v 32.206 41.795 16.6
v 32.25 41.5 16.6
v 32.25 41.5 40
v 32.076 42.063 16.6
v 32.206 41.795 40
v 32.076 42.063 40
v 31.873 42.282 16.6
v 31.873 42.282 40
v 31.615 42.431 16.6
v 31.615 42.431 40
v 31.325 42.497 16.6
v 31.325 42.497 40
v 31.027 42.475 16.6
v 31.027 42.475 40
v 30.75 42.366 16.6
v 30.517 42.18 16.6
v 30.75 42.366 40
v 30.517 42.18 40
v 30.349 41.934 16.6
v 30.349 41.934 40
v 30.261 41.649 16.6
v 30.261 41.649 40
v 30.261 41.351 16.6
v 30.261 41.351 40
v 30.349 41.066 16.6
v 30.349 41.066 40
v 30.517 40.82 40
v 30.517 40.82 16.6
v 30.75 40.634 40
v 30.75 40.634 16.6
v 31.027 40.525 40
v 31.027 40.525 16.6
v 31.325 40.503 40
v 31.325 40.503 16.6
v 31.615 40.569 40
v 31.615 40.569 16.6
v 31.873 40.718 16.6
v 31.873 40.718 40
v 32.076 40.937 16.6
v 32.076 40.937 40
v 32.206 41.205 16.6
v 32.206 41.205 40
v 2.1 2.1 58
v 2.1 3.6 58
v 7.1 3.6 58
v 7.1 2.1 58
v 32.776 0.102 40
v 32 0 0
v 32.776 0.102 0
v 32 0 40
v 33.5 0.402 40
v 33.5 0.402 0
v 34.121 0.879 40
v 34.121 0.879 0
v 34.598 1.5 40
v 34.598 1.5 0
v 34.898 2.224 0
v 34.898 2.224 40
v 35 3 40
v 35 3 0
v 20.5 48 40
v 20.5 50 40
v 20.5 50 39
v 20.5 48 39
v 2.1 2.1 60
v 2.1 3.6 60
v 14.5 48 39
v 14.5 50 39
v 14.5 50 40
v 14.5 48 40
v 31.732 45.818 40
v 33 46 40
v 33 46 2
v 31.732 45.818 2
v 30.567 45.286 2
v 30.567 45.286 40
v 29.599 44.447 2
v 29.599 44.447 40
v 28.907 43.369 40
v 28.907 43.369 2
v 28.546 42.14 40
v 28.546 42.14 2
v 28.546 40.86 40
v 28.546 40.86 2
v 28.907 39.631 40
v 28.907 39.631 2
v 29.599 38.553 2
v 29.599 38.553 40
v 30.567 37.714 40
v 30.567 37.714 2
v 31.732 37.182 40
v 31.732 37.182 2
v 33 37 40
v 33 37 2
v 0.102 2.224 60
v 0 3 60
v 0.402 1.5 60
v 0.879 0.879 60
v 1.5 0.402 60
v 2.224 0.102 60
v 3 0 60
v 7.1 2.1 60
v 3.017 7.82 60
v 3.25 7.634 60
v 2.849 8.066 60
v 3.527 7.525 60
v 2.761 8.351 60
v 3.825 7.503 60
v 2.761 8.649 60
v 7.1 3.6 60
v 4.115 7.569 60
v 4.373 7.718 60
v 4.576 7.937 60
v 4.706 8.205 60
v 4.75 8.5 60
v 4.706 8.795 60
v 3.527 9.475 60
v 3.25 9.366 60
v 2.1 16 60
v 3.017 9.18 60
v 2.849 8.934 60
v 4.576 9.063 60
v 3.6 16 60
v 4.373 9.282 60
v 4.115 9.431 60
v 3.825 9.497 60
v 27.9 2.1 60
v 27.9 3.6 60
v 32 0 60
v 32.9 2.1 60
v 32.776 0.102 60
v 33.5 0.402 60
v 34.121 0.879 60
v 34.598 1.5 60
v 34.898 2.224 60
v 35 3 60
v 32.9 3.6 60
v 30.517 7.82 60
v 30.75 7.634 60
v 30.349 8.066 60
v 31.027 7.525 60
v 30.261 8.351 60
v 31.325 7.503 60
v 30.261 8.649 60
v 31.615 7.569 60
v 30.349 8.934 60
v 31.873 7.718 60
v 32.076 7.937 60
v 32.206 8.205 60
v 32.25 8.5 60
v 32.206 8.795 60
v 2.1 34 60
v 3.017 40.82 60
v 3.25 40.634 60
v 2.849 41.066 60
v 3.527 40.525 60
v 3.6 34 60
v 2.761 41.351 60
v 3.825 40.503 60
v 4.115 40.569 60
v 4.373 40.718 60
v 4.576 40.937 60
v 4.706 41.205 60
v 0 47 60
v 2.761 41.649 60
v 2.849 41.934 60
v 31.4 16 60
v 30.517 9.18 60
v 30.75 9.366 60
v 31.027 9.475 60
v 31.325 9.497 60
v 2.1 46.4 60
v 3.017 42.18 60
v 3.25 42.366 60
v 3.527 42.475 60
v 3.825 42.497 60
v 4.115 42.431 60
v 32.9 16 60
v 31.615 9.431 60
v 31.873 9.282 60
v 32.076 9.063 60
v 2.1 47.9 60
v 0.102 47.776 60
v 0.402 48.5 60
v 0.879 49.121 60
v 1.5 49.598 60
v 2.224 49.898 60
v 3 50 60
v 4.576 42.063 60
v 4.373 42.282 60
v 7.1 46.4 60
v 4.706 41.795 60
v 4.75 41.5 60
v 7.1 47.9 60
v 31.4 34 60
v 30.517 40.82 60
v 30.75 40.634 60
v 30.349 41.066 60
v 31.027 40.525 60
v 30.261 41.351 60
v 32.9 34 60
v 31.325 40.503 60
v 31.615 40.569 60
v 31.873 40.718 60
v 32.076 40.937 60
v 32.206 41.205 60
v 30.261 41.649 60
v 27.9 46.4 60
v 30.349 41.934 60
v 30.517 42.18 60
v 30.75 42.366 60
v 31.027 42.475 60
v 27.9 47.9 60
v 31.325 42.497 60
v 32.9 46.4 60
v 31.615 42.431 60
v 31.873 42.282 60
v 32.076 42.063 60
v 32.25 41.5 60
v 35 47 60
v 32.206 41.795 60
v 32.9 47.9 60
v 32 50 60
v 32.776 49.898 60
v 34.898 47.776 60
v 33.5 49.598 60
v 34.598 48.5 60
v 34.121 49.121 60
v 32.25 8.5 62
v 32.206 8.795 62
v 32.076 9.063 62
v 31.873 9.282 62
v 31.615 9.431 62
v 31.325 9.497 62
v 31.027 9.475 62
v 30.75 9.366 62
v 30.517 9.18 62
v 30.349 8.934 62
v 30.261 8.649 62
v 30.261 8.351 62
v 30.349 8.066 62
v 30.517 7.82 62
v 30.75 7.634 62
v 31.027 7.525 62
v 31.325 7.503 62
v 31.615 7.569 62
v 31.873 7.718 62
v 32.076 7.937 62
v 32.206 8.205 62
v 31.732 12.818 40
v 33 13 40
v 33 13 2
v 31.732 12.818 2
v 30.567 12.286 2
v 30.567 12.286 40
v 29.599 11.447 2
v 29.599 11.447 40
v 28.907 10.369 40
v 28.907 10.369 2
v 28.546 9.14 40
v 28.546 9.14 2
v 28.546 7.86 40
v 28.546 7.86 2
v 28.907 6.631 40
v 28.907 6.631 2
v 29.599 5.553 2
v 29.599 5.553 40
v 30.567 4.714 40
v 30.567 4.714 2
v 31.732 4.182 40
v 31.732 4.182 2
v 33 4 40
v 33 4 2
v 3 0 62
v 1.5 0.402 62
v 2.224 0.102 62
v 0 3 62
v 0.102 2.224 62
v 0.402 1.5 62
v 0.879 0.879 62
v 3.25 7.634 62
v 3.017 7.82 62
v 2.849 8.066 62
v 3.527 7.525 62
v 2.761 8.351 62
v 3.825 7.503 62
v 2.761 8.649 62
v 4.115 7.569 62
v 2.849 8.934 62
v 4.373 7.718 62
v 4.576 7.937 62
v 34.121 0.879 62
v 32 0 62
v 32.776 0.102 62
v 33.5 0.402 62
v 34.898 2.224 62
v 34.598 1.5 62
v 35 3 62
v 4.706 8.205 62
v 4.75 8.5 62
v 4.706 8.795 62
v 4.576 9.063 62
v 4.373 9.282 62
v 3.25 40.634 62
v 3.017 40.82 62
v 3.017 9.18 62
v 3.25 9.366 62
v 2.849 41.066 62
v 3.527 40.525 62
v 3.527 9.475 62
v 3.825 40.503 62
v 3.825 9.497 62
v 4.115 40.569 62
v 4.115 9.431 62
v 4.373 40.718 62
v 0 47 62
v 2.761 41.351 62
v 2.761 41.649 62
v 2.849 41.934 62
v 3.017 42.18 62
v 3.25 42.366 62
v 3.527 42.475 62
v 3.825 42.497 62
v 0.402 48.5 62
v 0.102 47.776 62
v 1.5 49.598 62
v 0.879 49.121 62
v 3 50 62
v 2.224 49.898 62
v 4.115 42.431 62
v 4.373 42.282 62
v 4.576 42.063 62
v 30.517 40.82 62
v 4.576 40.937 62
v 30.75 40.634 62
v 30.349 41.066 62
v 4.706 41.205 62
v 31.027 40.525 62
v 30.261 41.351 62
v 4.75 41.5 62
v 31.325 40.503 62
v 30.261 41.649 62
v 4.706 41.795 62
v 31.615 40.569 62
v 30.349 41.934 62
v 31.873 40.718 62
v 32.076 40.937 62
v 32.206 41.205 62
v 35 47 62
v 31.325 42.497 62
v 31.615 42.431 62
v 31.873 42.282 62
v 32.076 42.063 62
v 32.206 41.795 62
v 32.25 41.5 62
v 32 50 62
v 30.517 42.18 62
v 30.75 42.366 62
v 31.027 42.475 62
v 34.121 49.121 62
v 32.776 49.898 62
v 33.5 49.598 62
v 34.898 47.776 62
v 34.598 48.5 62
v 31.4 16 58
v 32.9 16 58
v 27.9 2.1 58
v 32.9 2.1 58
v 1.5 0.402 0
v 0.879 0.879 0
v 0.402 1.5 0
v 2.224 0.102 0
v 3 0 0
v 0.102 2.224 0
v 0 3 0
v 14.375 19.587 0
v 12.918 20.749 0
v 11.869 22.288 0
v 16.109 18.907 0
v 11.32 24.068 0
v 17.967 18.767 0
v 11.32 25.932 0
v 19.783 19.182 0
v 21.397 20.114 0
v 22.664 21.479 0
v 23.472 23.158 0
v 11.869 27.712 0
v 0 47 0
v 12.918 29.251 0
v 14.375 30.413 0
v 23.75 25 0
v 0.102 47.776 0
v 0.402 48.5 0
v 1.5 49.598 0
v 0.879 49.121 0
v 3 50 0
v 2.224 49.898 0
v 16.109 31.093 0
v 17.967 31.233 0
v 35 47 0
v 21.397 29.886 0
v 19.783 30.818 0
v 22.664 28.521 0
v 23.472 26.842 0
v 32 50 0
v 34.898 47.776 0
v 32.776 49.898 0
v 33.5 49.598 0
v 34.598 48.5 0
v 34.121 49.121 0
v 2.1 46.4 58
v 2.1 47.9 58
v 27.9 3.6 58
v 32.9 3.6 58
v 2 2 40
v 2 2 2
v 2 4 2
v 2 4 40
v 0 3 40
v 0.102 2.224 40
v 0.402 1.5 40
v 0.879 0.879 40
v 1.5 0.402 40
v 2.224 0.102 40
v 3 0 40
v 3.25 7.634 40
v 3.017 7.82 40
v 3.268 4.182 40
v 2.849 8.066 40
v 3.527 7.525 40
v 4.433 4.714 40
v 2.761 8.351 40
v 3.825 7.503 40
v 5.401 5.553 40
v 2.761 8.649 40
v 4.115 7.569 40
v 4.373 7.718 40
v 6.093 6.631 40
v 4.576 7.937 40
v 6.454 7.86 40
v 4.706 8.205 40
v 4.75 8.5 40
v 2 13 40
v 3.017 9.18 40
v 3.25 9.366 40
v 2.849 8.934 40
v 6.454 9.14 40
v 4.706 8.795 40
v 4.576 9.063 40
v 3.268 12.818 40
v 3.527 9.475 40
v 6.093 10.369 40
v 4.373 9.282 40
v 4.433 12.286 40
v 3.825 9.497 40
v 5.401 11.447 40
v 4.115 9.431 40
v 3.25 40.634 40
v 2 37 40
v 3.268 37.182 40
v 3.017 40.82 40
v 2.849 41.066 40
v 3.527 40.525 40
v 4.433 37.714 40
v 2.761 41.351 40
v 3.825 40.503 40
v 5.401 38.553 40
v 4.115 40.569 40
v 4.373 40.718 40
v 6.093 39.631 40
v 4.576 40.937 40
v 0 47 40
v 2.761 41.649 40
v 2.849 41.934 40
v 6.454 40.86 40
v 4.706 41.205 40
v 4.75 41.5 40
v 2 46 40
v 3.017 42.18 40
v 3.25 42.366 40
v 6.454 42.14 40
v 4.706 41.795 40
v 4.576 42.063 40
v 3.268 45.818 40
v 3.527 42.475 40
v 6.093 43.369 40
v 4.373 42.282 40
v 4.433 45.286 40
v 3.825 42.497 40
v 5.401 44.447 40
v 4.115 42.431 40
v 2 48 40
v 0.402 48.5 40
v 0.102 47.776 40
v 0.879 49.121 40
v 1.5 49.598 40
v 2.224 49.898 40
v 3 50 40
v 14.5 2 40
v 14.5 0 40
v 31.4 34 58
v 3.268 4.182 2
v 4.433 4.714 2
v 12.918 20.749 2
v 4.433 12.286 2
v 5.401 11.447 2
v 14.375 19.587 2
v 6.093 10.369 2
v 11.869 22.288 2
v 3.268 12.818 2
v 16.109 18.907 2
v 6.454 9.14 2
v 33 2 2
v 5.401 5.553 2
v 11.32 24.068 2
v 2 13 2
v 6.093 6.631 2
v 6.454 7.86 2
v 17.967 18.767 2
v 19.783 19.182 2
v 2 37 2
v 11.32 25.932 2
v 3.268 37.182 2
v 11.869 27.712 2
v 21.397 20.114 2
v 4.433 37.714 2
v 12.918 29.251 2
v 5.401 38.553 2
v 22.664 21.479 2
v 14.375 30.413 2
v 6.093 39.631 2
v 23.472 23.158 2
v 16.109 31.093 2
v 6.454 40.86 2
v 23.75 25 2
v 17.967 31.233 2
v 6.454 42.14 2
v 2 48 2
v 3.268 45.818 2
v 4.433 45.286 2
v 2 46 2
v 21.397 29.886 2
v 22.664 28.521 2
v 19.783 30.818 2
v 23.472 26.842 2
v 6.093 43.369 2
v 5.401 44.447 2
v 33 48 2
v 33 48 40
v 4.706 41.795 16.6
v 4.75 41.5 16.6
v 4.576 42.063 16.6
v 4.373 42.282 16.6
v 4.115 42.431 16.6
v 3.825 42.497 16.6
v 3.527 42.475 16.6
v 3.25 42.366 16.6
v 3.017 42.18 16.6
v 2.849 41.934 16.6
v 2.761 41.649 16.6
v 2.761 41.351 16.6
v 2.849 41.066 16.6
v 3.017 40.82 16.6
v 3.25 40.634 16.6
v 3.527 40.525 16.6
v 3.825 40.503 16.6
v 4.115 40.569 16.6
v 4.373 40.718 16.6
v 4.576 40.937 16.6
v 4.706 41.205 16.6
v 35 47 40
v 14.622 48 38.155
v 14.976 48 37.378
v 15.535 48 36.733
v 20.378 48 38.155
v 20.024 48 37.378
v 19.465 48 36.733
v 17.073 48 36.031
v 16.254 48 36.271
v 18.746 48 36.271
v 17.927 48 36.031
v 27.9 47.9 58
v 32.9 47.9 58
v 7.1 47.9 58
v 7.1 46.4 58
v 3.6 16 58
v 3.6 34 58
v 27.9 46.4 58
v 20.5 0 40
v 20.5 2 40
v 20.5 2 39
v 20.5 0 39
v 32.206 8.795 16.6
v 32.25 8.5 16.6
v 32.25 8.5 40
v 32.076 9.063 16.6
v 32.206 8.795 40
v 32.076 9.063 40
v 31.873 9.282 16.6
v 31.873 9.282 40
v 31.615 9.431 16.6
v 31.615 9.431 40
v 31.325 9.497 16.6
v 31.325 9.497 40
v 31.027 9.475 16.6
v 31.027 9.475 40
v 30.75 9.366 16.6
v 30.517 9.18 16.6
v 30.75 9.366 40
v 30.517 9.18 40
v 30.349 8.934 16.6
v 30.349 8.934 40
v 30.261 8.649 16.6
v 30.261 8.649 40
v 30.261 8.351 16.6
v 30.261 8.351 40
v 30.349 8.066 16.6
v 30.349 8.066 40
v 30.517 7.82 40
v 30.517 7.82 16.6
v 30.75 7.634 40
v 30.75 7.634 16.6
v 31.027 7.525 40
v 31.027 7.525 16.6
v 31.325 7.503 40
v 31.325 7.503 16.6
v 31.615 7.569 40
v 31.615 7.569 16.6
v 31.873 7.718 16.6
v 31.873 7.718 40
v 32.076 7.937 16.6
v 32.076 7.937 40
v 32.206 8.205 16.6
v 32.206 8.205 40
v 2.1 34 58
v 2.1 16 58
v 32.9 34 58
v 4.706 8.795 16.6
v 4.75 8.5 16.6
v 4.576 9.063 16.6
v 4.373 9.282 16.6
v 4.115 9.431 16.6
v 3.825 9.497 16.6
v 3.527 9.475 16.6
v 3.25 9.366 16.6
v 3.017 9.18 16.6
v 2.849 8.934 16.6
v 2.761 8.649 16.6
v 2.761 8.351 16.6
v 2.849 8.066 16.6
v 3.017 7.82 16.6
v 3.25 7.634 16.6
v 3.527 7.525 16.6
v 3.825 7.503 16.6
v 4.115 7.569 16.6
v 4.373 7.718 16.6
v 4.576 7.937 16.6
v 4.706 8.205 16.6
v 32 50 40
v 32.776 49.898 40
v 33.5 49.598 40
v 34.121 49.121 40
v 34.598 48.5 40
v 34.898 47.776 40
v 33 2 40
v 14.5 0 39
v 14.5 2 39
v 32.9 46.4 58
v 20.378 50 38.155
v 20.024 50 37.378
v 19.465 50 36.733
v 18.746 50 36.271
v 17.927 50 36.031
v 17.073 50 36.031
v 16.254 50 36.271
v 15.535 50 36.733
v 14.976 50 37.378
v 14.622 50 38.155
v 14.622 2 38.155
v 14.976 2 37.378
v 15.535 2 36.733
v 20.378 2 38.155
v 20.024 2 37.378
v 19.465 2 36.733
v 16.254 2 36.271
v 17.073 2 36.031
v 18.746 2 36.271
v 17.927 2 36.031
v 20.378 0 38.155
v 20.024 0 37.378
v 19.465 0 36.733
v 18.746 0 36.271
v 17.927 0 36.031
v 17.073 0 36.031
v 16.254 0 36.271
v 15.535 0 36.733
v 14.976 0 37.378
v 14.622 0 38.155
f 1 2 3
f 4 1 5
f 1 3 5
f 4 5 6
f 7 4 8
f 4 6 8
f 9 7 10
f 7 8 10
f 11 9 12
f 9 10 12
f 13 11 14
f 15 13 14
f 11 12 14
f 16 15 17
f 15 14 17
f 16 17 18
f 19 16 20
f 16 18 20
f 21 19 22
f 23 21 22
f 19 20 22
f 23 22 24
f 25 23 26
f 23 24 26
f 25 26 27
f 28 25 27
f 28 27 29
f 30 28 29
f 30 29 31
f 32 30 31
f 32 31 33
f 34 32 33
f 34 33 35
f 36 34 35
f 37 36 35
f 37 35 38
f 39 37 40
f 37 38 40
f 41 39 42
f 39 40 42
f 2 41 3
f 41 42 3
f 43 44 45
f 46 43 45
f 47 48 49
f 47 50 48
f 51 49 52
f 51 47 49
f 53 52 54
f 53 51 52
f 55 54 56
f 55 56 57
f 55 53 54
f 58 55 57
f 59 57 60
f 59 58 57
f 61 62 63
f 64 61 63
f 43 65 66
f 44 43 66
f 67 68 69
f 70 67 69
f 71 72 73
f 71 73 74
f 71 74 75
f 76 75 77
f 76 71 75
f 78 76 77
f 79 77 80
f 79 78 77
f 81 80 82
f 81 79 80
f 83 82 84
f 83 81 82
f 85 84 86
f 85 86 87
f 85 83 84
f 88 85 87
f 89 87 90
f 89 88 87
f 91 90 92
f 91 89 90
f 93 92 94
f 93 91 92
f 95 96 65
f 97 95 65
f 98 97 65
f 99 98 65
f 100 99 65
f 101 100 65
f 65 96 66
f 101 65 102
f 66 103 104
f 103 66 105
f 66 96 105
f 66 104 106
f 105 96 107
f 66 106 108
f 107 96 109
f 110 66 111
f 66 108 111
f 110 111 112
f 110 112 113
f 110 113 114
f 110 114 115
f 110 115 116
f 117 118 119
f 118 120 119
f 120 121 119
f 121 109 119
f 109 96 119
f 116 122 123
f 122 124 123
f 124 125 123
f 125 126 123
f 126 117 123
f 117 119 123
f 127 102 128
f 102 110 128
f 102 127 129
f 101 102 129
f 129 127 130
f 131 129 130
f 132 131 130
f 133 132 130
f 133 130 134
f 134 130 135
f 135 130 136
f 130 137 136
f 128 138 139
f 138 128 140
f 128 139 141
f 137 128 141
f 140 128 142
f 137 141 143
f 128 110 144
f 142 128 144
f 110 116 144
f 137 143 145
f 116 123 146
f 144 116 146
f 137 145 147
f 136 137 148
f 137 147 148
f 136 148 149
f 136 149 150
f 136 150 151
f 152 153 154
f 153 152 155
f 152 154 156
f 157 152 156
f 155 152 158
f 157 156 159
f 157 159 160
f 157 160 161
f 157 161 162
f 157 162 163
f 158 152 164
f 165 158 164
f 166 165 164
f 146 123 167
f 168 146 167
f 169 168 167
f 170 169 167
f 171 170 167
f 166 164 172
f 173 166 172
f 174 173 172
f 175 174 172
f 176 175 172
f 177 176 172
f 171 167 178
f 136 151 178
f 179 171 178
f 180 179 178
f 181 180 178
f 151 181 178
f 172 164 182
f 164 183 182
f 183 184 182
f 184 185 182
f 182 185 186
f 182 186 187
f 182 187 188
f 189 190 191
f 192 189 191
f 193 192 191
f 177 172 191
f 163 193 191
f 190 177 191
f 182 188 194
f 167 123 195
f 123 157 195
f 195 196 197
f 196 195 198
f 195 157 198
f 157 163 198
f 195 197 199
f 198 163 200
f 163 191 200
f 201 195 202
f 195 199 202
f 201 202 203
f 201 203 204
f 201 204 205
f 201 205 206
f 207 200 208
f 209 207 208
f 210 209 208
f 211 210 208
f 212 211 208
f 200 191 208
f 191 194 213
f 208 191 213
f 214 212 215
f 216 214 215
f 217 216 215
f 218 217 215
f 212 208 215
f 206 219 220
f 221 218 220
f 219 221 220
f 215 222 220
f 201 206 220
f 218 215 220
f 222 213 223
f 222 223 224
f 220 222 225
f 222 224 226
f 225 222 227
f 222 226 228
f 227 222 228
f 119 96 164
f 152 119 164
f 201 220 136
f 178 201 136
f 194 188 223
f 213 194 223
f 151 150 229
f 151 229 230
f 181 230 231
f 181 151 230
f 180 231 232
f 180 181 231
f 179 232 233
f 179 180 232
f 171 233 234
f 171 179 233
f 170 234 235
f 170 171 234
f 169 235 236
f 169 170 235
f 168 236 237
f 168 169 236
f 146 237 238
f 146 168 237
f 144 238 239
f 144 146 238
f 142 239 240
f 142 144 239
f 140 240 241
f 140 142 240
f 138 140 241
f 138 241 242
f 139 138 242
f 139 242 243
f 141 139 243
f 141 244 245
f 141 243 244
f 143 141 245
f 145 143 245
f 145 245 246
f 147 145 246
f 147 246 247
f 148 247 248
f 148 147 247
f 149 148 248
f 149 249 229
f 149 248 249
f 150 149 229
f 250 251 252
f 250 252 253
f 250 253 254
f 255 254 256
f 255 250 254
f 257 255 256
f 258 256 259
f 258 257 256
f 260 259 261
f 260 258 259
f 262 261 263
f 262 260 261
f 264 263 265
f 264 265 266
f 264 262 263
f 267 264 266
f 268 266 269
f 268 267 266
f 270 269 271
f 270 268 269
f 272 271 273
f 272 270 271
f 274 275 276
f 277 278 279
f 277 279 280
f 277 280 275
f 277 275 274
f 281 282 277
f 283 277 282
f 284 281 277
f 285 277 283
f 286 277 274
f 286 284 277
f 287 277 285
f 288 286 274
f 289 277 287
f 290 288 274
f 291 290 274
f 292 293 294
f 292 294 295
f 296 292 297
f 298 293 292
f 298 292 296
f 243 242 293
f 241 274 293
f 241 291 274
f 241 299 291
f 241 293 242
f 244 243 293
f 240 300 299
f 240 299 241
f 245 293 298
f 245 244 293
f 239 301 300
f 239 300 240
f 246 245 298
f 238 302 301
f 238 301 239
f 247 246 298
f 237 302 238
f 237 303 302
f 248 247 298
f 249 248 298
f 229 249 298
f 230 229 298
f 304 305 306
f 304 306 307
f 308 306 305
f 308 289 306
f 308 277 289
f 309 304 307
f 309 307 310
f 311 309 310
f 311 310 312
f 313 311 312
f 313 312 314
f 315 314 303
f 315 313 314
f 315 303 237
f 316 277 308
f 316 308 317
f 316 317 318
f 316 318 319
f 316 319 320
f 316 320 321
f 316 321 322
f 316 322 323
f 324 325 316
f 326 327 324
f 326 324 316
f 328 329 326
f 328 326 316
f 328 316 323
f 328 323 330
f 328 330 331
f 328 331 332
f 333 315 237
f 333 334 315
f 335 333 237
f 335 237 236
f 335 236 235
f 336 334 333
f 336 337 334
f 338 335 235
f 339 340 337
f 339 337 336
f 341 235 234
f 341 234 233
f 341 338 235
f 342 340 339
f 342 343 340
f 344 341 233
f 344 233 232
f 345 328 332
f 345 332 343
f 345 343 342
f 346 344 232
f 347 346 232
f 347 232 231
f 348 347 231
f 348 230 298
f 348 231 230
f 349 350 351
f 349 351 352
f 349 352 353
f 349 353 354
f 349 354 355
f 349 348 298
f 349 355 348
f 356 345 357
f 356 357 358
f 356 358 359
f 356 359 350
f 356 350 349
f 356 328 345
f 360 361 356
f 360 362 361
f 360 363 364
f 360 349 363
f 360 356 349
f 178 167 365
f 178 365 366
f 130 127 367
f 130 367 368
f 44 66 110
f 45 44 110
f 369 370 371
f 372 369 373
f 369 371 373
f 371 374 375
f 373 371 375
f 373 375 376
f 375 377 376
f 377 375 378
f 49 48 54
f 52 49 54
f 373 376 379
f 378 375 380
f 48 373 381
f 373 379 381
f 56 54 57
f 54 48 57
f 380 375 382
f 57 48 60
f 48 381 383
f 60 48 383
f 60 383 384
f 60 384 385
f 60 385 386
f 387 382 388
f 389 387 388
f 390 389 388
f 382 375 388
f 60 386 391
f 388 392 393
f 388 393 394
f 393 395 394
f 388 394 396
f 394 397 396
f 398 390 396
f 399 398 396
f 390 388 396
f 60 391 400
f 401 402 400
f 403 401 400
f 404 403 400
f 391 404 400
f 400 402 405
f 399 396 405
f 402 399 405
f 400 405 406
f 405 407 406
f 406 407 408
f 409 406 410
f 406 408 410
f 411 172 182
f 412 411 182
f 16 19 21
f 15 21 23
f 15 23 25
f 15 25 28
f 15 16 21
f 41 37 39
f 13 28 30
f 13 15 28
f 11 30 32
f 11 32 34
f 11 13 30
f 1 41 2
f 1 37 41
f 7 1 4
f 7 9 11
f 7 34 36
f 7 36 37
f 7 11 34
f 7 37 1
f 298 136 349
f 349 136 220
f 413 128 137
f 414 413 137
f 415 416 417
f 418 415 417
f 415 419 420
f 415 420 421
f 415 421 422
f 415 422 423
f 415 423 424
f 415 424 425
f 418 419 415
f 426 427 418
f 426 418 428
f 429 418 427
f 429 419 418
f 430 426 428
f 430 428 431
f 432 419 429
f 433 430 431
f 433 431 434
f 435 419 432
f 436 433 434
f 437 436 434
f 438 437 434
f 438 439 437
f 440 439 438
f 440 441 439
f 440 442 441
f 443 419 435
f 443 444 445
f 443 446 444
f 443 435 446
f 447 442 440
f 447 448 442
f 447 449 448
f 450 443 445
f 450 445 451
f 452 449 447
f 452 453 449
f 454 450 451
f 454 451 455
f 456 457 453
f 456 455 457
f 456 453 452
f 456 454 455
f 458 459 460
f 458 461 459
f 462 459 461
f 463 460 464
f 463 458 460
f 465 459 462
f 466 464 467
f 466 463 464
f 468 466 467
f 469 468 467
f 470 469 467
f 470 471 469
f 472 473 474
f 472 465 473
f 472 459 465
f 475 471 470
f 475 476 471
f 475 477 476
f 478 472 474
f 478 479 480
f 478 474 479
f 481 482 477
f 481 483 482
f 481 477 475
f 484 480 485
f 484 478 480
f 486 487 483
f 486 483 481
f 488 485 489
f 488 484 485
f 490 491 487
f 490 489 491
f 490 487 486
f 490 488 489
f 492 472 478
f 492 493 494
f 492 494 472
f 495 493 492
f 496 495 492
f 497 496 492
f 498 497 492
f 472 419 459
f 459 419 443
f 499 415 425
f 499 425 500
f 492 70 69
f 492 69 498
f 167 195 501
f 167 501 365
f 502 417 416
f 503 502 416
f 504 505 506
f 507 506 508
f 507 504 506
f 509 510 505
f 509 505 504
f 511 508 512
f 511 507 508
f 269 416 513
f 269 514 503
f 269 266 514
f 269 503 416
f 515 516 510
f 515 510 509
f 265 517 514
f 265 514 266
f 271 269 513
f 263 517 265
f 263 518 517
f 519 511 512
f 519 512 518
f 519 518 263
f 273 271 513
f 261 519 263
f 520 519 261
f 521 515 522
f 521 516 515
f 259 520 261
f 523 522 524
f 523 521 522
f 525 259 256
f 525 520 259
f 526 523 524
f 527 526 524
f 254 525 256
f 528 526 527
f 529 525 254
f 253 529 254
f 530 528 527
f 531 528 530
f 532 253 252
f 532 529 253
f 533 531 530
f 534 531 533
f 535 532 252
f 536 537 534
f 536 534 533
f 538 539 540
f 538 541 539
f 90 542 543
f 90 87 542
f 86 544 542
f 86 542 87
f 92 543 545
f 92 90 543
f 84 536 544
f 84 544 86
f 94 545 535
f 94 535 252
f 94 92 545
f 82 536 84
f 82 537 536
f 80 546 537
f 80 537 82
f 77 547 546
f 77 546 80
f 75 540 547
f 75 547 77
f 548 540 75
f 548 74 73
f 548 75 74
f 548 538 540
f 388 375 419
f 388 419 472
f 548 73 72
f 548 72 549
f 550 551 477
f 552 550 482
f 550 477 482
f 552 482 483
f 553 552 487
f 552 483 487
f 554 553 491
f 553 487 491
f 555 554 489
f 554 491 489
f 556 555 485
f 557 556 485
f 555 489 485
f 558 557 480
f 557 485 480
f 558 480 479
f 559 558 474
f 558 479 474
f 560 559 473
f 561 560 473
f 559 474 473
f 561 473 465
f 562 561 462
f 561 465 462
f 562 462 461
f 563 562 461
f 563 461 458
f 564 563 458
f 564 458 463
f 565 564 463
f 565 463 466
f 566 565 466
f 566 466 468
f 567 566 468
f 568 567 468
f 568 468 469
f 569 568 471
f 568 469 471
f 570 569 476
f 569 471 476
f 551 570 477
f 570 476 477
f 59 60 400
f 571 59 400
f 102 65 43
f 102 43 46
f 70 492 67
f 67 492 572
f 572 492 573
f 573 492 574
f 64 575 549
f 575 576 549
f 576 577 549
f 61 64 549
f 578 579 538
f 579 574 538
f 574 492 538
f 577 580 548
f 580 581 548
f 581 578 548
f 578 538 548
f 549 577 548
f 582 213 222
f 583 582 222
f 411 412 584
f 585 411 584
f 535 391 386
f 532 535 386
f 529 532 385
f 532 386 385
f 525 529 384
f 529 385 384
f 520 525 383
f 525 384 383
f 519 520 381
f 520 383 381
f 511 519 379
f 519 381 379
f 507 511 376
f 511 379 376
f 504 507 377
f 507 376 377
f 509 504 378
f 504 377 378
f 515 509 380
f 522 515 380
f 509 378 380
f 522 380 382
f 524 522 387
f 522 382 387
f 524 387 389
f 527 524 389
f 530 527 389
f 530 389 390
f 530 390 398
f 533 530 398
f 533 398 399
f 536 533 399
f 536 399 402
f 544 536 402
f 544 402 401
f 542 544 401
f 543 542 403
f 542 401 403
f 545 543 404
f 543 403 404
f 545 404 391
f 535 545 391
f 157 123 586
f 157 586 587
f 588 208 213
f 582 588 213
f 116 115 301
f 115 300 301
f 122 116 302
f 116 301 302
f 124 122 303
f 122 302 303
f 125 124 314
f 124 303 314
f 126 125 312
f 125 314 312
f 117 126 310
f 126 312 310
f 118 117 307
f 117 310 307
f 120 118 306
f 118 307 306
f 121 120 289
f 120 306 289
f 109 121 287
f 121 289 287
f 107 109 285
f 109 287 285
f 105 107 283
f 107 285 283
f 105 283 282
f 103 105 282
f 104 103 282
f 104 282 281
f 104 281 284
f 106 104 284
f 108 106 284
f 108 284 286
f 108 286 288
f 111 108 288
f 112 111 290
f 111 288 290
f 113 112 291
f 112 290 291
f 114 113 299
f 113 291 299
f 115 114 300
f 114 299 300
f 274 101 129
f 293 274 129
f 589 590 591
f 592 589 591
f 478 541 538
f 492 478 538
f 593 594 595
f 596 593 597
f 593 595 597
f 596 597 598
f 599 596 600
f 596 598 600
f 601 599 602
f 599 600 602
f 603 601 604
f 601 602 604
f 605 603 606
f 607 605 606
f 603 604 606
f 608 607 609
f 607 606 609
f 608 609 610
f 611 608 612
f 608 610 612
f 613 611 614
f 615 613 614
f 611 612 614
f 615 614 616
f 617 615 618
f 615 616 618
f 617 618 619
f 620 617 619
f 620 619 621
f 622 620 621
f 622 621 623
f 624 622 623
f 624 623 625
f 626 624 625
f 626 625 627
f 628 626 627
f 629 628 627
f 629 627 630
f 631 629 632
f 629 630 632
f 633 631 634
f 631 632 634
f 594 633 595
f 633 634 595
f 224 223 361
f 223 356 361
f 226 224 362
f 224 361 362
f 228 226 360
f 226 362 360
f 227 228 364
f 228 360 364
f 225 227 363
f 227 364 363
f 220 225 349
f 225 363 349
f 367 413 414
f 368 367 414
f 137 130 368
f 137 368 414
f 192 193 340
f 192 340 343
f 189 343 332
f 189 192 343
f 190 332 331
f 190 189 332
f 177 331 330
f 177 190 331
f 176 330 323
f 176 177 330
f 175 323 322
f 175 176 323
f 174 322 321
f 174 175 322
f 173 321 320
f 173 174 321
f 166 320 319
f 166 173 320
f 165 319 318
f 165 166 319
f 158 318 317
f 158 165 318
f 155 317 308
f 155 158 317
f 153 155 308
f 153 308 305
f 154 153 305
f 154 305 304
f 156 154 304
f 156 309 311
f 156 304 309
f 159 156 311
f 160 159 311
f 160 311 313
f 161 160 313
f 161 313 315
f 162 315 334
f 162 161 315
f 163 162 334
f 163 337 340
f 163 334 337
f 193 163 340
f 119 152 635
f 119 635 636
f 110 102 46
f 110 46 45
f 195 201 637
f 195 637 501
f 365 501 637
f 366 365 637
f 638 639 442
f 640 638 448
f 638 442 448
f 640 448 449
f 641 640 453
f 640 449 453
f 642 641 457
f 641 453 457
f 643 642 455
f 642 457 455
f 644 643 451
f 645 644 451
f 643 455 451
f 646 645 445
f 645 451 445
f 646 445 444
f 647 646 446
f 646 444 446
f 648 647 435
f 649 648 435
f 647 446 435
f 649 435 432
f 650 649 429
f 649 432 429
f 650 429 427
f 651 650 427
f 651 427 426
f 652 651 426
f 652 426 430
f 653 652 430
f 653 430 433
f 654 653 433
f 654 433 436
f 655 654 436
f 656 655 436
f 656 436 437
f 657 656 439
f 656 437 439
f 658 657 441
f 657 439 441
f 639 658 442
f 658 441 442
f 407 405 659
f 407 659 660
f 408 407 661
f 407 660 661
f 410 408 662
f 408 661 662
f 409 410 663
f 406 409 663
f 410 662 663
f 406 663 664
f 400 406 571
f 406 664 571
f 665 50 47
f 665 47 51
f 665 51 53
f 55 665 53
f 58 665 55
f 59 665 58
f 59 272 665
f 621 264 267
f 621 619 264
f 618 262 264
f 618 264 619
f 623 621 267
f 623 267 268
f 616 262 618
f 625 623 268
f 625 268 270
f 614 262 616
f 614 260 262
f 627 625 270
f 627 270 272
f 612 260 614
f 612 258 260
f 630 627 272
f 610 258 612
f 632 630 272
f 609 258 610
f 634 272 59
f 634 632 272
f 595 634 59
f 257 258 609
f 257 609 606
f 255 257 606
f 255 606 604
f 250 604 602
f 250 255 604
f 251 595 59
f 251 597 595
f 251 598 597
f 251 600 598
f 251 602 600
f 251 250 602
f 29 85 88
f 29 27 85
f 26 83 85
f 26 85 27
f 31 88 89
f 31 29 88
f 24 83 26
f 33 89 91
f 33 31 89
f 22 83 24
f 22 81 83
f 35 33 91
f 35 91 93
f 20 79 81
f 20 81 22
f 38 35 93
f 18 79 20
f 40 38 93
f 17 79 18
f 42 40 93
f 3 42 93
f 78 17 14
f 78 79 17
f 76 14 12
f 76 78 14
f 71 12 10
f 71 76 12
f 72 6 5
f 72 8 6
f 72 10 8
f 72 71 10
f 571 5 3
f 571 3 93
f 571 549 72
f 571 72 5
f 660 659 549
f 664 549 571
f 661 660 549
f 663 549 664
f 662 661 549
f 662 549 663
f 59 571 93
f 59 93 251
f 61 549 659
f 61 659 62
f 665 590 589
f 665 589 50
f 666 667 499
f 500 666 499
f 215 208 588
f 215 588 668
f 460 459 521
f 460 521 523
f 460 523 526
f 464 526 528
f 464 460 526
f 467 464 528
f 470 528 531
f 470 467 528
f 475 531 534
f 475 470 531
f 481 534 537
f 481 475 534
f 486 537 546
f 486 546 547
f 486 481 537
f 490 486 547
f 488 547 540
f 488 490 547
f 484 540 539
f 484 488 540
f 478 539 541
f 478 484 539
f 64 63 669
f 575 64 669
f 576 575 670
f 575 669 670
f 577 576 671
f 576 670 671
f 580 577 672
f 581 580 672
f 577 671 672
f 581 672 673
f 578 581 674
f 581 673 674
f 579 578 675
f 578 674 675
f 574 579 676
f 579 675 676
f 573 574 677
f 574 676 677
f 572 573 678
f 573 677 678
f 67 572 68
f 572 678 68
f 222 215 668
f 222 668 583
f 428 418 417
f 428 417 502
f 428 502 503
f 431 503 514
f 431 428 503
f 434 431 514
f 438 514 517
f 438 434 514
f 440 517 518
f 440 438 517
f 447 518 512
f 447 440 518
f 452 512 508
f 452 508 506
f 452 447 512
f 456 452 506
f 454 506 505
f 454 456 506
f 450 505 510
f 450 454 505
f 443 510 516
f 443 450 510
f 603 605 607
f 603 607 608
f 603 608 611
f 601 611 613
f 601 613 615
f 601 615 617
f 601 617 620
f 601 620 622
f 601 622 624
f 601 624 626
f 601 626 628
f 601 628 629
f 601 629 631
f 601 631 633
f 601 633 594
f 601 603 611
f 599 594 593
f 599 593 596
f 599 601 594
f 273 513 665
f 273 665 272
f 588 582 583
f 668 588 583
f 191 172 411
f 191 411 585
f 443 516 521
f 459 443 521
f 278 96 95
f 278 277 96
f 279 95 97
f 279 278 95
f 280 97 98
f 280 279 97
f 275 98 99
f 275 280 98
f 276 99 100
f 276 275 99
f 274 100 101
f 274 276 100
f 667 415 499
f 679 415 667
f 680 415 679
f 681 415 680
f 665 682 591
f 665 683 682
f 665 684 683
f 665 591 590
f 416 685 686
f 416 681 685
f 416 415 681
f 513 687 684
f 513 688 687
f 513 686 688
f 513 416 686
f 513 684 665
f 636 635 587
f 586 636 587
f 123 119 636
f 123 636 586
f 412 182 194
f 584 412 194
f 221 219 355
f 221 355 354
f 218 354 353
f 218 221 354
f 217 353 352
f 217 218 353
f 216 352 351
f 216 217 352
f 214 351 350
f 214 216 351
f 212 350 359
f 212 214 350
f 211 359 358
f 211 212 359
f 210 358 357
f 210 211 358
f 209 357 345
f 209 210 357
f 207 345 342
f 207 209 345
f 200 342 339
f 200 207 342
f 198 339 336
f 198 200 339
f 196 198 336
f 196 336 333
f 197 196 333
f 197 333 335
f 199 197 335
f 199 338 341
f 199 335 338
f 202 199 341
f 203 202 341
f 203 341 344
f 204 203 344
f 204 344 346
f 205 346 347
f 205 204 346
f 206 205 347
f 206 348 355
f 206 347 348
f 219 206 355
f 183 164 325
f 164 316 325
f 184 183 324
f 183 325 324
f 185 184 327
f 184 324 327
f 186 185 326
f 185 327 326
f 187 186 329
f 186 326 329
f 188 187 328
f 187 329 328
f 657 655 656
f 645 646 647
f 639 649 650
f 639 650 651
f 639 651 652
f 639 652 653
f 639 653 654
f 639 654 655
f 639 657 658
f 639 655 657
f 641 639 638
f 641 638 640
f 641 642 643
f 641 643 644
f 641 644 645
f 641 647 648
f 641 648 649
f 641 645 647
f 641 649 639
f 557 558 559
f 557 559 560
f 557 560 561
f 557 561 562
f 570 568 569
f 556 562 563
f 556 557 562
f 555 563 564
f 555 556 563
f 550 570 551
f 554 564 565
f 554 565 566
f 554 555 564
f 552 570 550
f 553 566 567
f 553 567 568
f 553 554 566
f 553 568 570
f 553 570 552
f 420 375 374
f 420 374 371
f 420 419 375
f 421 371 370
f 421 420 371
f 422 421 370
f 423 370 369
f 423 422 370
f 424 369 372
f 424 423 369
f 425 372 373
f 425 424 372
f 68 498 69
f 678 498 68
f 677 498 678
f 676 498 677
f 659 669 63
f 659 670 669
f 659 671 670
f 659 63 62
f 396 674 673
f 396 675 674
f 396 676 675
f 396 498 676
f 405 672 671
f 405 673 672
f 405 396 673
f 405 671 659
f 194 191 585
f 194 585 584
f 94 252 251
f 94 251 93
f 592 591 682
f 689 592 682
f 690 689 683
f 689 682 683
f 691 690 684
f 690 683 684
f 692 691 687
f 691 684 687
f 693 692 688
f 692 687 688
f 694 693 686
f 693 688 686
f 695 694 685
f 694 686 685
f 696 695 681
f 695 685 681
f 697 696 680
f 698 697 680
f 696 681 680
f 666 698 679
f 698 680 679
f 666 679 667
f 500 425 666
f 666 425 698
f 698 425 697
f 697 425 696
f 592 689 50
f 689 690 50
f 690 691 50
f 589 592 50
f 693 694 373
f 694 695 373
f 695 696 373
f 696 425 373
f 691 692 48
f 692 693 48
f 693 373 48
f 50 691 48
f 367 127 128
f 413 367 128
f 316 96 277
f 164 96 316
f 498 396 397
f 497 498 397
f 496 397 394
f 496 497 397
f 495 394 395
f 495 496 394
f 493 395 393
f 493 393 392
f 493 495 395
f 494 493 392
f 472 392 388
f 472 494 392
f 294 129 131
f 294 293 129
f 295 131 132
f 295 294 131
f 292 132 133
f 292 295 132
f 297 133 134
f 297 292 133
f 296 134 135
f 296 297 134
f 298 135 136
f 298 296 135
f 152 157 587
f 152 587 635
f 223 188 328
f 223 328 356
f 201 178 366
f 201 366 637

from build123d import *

# Parameters (mm, degrees)
F0_W      = 35
F0_H      = 50
F1_DEPTH  = 40
F2_T      = -2
F3_R      = 6.25
F4_DEPTH  = 2
F6_DEPTH  = 50.001
F8_DEPTH  = 39
F10_W     = 35
F10_H     = 50
F11_DEPTH = 2
F12_W     = 5
F12_H     = 1.5
F13_DEPTH = 4
F14_R     = 1
F15_DEPTH = 23.4
F16_R     = 3
F16_2_R   = 3


with BuildPart() as f1:
    # F0 (on Top) → F1 (new body)
    with BuildSketch(Plane.XY):
        with Locations((17.5, 25)):
            Rectangle(F0_W, F0_H)
    extrude(amount=F1_DEPTH)

    # F2
    f2_openings = [f1.faces().sort_by_distance(p)[0] for p in [
        (17.5, 25, 40),
    ]]
    offset(amount=F2_T, openings=f2_openings)

    # F3 (on face) → F4 (cut, through all)
    with BuildSketch(Plane(origin=(0, 0, 0), x_dir=(1, 0, 0), z_dir=(0, 0, -1))):
        with Locations((17.5, -25)):
            Circle(F3_R)
    extrude(amount=-F4_DEPTH, mode=Mode.SUBTRACT)

    # F5 (on face) → F6 (cut, through all)
    with BuildSketch(Plane(origin=(0, 50, 0), x_dir=(-1, 0, 0), z_dir=(0, 1, 0))):
        with BuildLine():
            Line((-14.5, 40), (-20.5, 40))
            Line((-20.5, 40), (-20.5, 39))
            ThreePointArc((-20.5, 39), (-17.5, 36), (-14.5, 39))
            Line((-14.5, 39), (-14.5, 40))
        make_face()
    extrude(amount=-F6_DEPTH, mode=Mode.SUBTRACT)

    # F7 (on face) → F8 (join)
    with BuildSketch(Plane.XY.offset(40)):
        with BuildLine():
            Line((2, 46), (2, 37))
            ThreePointArc((2, 37), (6.5, 41.5), (2, 46))
        make_face()
        with BuildLine():
            ThreePointArc((33, 46), (28.5, 41.5), (33, 37))
            Line((33, 37), (33, 46))
        make_face()
        with BuildLine():
            Line((33, 4), (33, 13))
            ThreePointArc((33, 13), (28.5, 8.5), (33, 4))
        make_face()
        with BuildLine():
            ThreePointArc((2, 4), (6.5, 8.5), (2, 13))
            Line((2, 13), (2, 4))
        make_face()
    extrude(amount=-F8_DEPTH)


with BuildPart() as f11:
    # F10 (on offset) → F11 (new body)
    with BuildSketch(Plane.XY.offset(60)):
        with Locations((17.5, 25)):
            Rectangle(F10_W, F10_H)
    extrude(amount=F11_DEPTH)

    # F12 (on face) → F13 (join)
    with BuildSketch(Plane.XY.offset(62)):
        Polygon((3.6, 25), (3.6, 34), (2.1, 34), (2.1, 25), (2.1, 16), (3.6, 16), align=None)
        with Locations((4.6, 47.15)):
            Rectangle(F12_W, F12_H)
        with Locations((30.4, 47.15)):
            Rectangle(F12_W, F12_H)
        Polygon((32.9, 34), (31.4, 34), (31.4, 25), (31.4, 16), (32.9, 16), (32.9, 25), align=None)
        with Locations((30.4, 2.85)):
            Rectangle(F12_W, F12_H)
        with Locations((4.6, 2.85)):
            Rectangle(F12_W, F12_H)
    extrude(amount=-F13_DEPTH)


with BuildPart() as f15_tool:
    # F14 (on face) → F15 (new body, symmetric)
    with BuildSketch(Plane.XY.offset(40)):
        with Locations((31.25, 41.5)):
            Circle(F14_R)
        with Locations((31.25, 8.5)):
            Circle(F14_R)
        with Locations((3.75, 41.5)):
            Circle(F14_R)
        with Locations((3.75, 8.5)):
            Circle(F14_R)
    extrude(amount=F15_DEPTH, both=True)


with BuildPart() as f1_1:
    add(f1.part)

    # F15: cut by f15_tool
    add(f15_tool.part, mode=Mode.SUBTRACT)

    # F16
    f16_edges = [f1_1.edges().sort_by_distance(p)[0] for p in [
        (35, 0, 20),
        (0, 0, 20),
        (35, 50, 20),
        (0, 50, 20),
    ]]
    fillet(f16_edges, radius=F16_R)


with BuildPart() as f11_1:
    add(f11.part)

    # F15: cut by f15_tool
    add(f15_tool.part, mode=Mode.SUBTRACT)

    # F16#2
    f16_2_edges = [f11_1.edges().sort_by_distance(p)[0] for p in [
        (0, 0, 61),
        (35, 0, 61),
        (35, 50, 61),
        (0, 50, 61),
    ]]
    fillet(f16_2_edges, radius=F16_2_R)


solid = Compound([f1_1.part, f11_1.part])
